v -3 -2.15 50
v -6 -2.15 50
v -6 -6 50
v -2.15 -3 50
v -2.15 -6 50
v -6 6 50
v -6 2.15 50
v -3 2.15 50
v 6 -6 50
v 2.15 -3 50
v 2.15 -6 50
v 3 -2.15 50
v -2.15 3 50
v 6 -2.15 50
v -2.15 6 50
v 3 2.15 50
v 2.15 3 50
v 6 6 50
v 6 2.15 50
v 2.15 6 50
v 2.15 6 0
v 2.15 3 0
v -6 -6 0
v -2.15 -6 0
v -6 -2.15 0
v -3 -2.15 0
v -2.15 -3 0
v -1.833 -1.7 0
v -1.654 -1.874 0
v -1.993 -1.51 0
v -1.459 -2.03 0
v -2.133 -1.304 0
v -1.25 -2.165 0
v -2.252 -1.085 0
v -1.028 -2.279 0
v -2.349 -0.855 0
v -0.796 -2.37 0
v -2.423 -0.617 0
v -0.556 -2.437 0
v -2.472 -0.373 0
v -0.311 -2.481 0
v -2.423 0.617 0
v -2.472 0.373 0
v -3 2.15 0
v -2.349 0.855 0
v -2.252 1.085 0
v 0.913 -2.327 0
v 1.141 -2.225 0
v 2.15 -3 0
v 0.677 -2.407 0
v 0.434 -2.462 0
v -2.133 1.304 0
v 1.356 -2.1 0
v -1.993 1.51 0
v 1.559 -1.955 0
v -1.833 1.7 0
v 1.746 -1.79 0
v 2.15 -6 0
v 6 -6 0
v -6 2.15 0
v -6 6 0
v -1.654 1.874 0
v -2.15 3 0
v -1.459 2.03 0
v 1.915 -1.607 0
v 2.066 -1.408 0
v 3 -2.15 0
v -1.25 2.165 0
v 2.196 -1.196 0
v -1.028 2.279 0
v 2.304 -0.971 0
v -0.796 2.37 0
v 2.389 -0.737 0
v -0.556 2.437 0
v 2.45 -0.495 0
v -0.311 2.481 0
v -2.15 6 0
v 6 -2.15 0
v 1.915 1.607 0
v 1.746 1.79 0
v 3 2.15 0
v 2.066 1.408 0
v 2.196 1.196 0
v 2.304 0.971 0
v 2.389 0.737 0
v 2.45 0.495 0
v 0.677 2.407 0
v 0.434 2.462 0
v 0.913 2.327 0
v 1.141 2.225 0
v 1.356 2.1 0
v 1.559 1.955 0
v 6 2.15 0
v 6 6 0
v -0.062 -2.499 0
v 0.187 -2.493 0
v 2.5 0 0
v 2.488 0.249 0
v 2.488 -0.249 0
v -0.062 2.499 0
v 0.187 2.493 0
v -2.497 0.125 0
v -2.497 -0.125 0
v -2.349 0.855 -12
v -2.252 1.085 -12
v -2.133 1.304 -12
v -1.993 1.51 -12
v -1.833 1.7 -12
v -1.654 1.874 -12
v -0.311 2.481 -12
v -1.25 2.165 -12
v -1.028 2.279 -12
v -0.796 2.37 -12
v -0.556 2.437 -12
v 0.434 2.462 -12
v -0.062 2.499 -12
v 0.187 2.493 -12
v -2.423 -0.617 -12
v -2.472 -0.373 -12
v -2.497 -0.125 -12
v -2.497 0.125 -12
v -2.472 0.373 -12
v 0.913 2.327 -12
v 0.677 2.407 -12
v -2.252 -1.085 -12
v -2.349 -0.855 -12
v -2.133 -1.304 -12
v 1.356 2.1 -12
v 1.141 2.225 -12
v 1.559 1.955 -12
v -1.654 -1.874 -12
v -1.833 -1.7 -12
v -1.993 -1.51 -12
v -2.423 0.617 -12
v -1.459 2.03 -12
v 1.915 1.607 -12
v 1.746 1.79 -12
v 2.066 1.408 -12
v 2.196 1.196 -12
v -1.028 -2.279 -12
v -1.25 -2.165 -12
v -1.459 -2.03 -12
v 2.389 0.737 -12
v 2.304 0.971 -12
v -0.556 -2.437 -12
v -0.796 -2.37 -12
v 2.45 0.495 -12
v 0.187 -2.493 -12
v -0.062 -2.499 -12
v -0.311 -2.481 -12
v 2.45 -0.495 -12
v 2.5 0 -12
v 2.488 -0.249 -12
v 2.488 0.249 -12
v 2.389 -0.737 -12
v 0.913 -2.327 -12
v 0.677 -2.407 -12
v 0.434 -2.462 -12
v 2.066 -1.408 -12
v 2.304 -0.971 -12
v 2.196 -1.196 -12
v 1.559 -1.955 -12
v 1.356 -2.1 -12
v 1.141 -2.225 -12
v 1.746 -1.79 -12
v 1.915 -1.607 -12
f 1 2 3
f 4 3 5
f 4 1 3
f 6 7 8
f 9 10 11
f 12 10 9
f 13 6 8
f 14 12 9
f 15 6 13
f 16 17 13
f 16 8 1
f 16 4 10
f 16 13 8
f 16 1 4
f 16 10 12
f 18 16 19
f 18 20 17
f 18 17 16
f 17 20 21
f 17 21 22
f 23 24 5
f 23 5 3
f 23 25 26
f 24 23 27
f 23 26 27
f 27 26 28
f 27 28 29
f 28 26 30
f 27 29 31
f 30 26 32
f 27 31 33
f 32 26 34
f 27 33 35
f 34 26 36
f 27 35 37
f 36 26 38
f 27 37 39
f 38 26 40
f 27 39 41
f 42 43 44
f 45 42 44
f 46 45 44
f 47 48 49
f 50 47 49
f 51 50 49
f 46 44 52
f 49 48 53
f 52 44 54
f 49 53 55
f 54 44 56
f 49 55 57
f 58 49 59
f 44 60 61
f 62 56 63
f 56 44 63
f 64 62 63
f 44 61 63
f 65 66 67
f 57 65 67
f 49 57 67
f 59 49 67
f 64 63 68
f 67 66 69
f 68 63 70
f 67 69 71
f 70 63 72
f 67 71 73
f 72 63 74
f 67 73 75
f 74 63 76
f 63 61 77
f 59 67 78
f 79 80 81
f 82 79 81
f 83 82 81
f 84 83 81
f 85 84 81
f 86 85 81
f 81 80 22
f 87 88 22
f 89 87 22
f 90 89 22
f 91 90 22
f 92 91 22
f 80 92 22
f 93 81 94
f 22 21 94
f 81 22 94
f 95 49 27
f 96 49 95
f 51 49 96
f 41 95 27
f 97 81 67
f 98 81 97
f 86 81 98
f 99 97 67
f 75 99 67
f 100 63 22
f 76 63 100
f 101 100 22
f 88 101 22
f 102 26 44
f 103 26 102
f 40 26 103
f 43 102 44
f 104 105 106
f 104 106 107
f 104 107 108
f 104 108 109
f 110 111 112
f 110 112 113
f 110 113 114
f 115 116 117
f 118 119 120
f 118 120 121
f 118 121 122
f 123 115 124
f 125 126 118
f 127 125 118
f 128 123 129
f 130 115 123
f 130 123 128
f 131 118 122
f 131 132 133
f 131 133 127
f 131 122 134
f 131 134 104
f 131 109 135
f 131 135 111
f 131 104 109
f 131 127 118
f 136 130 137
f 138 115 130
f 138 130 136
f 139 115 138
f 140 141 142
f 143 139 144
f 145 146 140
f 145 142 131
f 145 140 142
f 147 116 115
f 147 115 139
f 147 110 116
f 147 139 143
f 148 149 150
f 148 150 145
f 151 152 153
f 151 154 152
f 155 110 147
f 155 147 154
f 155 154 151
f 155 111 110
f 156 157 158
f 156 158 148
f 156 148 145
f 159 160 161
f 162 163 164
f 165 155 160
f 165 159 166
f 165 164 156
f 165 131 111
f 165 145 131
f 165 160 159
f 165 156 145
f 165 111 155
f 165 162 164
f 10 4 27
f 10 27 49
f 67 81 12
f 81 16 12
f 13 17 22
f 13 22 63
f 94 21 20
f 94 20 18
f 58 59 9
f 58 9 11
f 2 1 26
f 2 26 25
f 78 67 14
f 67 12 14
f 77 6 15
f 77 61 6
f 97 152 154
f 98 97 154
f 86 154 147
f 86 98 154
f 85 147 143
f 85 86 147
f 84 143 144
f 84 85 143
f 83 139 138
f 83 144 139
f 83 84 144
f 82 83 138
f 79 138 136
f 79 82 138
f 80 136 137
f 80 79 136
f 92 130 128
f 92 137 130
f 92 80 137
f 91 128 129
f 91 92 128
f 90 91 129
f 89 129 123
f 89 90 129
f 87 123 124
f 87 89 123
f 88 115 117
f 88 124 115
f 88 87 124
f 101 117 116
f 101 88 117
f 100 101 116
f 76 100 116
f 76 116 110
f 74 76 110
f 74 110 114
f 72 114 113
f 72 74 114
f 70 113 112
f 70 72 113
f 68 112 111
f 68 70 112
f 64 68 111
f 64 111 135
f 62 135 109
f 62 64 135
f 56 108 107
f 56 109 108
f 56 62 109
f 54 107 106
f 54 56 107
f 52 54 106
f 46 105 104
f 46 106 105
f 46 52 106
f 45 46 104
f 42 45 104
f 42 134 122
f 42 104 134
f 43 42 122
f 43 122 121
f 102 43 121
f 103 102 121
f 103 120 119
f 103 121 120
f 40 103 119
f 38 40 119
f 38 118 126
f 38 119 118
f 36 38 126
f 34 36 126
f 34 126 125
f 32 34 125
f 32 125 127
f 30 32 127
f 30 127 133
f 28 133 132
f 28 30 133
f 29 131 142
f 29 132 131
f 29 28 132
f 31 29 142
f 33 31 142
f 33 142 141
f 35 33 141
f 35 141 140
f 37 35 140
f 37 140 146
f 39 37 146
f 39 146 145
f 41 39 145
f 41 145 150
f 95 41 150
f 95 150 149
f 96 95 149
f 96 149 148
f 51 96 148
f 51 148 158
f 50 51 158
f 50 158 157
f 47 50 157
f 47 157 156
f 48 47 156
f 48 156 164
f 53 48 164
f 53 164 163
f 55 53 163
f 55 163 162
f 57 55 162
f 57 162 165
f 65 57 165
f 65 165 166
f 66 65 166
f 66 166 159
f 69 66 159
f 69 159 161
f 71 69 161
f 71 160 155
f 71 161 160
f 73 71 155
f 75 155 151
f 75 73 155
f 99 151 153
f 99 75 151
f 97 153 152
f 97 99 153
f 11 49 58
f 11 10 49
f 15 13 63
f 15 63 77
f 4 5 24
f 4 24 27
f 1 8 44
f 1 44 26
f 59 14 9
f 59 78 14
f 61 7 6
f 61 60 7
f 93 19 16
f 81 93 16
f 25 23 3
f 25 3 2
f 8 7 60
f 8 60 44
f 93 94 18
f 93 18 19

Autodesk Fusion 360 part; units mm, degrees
sketch "Sketch1" plane through (0, 0, 0) normal (0, 0, 1) x (1, 0, 0) in component "Pillar"
  line L0 (6, -6) -> (-6, -6)
  line L1 (-6, -6) -> (-6, 6)
  line L2 (-6, 6) -> (6, 6)
  line L3 (6, 6) -> (6, -6)
  line L4 (6, -6) -> (-6, 6) construction
  line L5 (-6, -6) -> (6, 6) construction
  dimension "d1" = 12
  dimension "d2" = 12
extrude "Extrude1" add sketch "Sketch1" along normal blind 50 in component "Pillar"
sketch "Sketch2" plane through (0, 0, 50) normal (0, 0, 1) x (-1, 0, 0) in component "Pillar"
  line L0 (-6, -6) -> (6, -6)
  line L1 (6, -6) -> (6, 6)
  line L2 (6, 6) -> (-6, 6)
  line L3 (-6, 6) -> (-6, -6)
  line L4 (-3, 2.15) -> (-9, 2.15)
  line L5 (-9, 2.15) -> (-9, -2.15)
  line L6 (-9, -2.15) -> (-3, -2.15)
  line L7 (-3, -2.15) -> (-3, 2.15)
  line L8 (-3, 2.15) -> (-9, -2.15) construction
  line L9 (-9, 2.15) -> (-3, -2.15) construction
  line L10 (2.15, -9) -> (-2.15, -9)
  line L11 (-2.15, -9) -> (-2.15, -3)
  line L12 (-2.15, -3) -> (2.15, -3)
  line L13 (2.15, -3) -> (2.15, -9)
  line L14 (2.15, -9) -> (-2.15, -3) construction
  line L15 (-2.15, -9) -> (2.15, -3) construction
  line L16 (9, -2.15) -> (3, -2.15)
  line L17 (3, -2.15) -> (3, 2.15)
  line L18 (3, 2.15) -> (9, 2.15)
  line L19 (9, 2.15) -> (9, -2.15)
  line L20 (9, -2.15) -> (3, 2.15) construction
  line L21 (3, -2.15) -> (9, 2.15) construction
  line L22 (-2.15, 9) -> (2.15, 9)
  line L23 (2.15, 9) -> (2.15, 3)
  line L24 (2.15, 3) -> (-2.15, 3)
  line L25 (-2.15, 3) -> (-2.15, 9)
  line L26 (-2.15, 9) -> (2.15, 3) construction
  line L27 (2.15, 9) -> (-2.15, 3) construction
  point P0 (-6, 0)
  point P1 (0, -6)
  point P2 (6, 0)
  point P3 (0, 6)
  dimension "d5" = 6
  dimension "d6" = 4.3
  dimension "d9" = 4.3
  dimension "d10" = 6
  dimension "d11" = 6
  dimension "d12" = 4.3
  dimension "d13" = 4.3
  dimension "d14" = 6
extrude "Extrude7" cut sketch "Sketch2" against normal blind 50 contours L0 L11 L12 L13 | L3 L4 L6 L7 | L1 L16 L17 L18 | L2 L23 L24 L25 in component "Pillar"
extrude "Extrude3" cut sketch "Sketch2" against normal blind 30 contours L0 L11 L12 L13 in component "Pillar"
extrude "Extrude2" cut sketch "Sketch2" against normal blind 30 contours L3 L4 L6 L7 in component "Pillar"
extrude "Extrude4" cut sketch "Sketch2" against normal blind 30 contours L1 L16 L17 L18 in component "Pillar"
extrude "Extrude5" cut sketch "Sketch2" against normal blind 30 contours L2 L23 L24 L25 in component "Pillar"
sketch "Sketch3" plane through (0, 0, 0) normal (0, 0, -1) x (1, 0, 0) in component "Pillar"
  line L0 (2.15, -6) -> (6, -6)
  line L1 (6, -6) -> (6, -2.15)
  line L2 (6, 6) -> (2.15, 6)
  line L3 (-6, 6) -> (-6, 2.15)
  circle A0 centre (0, 0) radius 2.5
  line L4 (-2.15, -6) -> (-2.15, -3)
  line L5 (-2.15, -3) -> (2.15, -3)
  line L6 (2.15, -3) -> (2.15, -6)
  line L7 (6, -2.15) -> (3, -2.15)
  line L8 (3, -2.15) -> (3, 2.15)
  line L9 (3, 2.15) -> (6, 2.15)
  line L10 (6, 2.15) -> (6, 6)
  line L11 (2.15, 6) -> (2.15, 3)
  line L12 (2.15, 3) -> (-2.15, 3)
  line L13 (-2.15, 3) -> (-2.15, 6)
  line L14 (-2.15, 6) -> (-6, 6)
  line L15 (-6, 2.15) -> (-3, 2.15)
  line L16 (-3, 2.15) -> (-3, -2.15)
  line L17 (-3, -2.15) -> (-6, -2.15)
  line L18 (-6, -2.15) -> (-6, -6)
  line L19 (-6, -6) -> (-2.15, -6)
  dimension "d21" = 5
extrude "Extrude6" add sketch "Sketch3" along normal blind 12 contours A0 in component "Pillar"
component "Pillar" placed x (1, 0, 0) y (0, 1, 0) z (0, 0, 1) at (0, 0, 0)
